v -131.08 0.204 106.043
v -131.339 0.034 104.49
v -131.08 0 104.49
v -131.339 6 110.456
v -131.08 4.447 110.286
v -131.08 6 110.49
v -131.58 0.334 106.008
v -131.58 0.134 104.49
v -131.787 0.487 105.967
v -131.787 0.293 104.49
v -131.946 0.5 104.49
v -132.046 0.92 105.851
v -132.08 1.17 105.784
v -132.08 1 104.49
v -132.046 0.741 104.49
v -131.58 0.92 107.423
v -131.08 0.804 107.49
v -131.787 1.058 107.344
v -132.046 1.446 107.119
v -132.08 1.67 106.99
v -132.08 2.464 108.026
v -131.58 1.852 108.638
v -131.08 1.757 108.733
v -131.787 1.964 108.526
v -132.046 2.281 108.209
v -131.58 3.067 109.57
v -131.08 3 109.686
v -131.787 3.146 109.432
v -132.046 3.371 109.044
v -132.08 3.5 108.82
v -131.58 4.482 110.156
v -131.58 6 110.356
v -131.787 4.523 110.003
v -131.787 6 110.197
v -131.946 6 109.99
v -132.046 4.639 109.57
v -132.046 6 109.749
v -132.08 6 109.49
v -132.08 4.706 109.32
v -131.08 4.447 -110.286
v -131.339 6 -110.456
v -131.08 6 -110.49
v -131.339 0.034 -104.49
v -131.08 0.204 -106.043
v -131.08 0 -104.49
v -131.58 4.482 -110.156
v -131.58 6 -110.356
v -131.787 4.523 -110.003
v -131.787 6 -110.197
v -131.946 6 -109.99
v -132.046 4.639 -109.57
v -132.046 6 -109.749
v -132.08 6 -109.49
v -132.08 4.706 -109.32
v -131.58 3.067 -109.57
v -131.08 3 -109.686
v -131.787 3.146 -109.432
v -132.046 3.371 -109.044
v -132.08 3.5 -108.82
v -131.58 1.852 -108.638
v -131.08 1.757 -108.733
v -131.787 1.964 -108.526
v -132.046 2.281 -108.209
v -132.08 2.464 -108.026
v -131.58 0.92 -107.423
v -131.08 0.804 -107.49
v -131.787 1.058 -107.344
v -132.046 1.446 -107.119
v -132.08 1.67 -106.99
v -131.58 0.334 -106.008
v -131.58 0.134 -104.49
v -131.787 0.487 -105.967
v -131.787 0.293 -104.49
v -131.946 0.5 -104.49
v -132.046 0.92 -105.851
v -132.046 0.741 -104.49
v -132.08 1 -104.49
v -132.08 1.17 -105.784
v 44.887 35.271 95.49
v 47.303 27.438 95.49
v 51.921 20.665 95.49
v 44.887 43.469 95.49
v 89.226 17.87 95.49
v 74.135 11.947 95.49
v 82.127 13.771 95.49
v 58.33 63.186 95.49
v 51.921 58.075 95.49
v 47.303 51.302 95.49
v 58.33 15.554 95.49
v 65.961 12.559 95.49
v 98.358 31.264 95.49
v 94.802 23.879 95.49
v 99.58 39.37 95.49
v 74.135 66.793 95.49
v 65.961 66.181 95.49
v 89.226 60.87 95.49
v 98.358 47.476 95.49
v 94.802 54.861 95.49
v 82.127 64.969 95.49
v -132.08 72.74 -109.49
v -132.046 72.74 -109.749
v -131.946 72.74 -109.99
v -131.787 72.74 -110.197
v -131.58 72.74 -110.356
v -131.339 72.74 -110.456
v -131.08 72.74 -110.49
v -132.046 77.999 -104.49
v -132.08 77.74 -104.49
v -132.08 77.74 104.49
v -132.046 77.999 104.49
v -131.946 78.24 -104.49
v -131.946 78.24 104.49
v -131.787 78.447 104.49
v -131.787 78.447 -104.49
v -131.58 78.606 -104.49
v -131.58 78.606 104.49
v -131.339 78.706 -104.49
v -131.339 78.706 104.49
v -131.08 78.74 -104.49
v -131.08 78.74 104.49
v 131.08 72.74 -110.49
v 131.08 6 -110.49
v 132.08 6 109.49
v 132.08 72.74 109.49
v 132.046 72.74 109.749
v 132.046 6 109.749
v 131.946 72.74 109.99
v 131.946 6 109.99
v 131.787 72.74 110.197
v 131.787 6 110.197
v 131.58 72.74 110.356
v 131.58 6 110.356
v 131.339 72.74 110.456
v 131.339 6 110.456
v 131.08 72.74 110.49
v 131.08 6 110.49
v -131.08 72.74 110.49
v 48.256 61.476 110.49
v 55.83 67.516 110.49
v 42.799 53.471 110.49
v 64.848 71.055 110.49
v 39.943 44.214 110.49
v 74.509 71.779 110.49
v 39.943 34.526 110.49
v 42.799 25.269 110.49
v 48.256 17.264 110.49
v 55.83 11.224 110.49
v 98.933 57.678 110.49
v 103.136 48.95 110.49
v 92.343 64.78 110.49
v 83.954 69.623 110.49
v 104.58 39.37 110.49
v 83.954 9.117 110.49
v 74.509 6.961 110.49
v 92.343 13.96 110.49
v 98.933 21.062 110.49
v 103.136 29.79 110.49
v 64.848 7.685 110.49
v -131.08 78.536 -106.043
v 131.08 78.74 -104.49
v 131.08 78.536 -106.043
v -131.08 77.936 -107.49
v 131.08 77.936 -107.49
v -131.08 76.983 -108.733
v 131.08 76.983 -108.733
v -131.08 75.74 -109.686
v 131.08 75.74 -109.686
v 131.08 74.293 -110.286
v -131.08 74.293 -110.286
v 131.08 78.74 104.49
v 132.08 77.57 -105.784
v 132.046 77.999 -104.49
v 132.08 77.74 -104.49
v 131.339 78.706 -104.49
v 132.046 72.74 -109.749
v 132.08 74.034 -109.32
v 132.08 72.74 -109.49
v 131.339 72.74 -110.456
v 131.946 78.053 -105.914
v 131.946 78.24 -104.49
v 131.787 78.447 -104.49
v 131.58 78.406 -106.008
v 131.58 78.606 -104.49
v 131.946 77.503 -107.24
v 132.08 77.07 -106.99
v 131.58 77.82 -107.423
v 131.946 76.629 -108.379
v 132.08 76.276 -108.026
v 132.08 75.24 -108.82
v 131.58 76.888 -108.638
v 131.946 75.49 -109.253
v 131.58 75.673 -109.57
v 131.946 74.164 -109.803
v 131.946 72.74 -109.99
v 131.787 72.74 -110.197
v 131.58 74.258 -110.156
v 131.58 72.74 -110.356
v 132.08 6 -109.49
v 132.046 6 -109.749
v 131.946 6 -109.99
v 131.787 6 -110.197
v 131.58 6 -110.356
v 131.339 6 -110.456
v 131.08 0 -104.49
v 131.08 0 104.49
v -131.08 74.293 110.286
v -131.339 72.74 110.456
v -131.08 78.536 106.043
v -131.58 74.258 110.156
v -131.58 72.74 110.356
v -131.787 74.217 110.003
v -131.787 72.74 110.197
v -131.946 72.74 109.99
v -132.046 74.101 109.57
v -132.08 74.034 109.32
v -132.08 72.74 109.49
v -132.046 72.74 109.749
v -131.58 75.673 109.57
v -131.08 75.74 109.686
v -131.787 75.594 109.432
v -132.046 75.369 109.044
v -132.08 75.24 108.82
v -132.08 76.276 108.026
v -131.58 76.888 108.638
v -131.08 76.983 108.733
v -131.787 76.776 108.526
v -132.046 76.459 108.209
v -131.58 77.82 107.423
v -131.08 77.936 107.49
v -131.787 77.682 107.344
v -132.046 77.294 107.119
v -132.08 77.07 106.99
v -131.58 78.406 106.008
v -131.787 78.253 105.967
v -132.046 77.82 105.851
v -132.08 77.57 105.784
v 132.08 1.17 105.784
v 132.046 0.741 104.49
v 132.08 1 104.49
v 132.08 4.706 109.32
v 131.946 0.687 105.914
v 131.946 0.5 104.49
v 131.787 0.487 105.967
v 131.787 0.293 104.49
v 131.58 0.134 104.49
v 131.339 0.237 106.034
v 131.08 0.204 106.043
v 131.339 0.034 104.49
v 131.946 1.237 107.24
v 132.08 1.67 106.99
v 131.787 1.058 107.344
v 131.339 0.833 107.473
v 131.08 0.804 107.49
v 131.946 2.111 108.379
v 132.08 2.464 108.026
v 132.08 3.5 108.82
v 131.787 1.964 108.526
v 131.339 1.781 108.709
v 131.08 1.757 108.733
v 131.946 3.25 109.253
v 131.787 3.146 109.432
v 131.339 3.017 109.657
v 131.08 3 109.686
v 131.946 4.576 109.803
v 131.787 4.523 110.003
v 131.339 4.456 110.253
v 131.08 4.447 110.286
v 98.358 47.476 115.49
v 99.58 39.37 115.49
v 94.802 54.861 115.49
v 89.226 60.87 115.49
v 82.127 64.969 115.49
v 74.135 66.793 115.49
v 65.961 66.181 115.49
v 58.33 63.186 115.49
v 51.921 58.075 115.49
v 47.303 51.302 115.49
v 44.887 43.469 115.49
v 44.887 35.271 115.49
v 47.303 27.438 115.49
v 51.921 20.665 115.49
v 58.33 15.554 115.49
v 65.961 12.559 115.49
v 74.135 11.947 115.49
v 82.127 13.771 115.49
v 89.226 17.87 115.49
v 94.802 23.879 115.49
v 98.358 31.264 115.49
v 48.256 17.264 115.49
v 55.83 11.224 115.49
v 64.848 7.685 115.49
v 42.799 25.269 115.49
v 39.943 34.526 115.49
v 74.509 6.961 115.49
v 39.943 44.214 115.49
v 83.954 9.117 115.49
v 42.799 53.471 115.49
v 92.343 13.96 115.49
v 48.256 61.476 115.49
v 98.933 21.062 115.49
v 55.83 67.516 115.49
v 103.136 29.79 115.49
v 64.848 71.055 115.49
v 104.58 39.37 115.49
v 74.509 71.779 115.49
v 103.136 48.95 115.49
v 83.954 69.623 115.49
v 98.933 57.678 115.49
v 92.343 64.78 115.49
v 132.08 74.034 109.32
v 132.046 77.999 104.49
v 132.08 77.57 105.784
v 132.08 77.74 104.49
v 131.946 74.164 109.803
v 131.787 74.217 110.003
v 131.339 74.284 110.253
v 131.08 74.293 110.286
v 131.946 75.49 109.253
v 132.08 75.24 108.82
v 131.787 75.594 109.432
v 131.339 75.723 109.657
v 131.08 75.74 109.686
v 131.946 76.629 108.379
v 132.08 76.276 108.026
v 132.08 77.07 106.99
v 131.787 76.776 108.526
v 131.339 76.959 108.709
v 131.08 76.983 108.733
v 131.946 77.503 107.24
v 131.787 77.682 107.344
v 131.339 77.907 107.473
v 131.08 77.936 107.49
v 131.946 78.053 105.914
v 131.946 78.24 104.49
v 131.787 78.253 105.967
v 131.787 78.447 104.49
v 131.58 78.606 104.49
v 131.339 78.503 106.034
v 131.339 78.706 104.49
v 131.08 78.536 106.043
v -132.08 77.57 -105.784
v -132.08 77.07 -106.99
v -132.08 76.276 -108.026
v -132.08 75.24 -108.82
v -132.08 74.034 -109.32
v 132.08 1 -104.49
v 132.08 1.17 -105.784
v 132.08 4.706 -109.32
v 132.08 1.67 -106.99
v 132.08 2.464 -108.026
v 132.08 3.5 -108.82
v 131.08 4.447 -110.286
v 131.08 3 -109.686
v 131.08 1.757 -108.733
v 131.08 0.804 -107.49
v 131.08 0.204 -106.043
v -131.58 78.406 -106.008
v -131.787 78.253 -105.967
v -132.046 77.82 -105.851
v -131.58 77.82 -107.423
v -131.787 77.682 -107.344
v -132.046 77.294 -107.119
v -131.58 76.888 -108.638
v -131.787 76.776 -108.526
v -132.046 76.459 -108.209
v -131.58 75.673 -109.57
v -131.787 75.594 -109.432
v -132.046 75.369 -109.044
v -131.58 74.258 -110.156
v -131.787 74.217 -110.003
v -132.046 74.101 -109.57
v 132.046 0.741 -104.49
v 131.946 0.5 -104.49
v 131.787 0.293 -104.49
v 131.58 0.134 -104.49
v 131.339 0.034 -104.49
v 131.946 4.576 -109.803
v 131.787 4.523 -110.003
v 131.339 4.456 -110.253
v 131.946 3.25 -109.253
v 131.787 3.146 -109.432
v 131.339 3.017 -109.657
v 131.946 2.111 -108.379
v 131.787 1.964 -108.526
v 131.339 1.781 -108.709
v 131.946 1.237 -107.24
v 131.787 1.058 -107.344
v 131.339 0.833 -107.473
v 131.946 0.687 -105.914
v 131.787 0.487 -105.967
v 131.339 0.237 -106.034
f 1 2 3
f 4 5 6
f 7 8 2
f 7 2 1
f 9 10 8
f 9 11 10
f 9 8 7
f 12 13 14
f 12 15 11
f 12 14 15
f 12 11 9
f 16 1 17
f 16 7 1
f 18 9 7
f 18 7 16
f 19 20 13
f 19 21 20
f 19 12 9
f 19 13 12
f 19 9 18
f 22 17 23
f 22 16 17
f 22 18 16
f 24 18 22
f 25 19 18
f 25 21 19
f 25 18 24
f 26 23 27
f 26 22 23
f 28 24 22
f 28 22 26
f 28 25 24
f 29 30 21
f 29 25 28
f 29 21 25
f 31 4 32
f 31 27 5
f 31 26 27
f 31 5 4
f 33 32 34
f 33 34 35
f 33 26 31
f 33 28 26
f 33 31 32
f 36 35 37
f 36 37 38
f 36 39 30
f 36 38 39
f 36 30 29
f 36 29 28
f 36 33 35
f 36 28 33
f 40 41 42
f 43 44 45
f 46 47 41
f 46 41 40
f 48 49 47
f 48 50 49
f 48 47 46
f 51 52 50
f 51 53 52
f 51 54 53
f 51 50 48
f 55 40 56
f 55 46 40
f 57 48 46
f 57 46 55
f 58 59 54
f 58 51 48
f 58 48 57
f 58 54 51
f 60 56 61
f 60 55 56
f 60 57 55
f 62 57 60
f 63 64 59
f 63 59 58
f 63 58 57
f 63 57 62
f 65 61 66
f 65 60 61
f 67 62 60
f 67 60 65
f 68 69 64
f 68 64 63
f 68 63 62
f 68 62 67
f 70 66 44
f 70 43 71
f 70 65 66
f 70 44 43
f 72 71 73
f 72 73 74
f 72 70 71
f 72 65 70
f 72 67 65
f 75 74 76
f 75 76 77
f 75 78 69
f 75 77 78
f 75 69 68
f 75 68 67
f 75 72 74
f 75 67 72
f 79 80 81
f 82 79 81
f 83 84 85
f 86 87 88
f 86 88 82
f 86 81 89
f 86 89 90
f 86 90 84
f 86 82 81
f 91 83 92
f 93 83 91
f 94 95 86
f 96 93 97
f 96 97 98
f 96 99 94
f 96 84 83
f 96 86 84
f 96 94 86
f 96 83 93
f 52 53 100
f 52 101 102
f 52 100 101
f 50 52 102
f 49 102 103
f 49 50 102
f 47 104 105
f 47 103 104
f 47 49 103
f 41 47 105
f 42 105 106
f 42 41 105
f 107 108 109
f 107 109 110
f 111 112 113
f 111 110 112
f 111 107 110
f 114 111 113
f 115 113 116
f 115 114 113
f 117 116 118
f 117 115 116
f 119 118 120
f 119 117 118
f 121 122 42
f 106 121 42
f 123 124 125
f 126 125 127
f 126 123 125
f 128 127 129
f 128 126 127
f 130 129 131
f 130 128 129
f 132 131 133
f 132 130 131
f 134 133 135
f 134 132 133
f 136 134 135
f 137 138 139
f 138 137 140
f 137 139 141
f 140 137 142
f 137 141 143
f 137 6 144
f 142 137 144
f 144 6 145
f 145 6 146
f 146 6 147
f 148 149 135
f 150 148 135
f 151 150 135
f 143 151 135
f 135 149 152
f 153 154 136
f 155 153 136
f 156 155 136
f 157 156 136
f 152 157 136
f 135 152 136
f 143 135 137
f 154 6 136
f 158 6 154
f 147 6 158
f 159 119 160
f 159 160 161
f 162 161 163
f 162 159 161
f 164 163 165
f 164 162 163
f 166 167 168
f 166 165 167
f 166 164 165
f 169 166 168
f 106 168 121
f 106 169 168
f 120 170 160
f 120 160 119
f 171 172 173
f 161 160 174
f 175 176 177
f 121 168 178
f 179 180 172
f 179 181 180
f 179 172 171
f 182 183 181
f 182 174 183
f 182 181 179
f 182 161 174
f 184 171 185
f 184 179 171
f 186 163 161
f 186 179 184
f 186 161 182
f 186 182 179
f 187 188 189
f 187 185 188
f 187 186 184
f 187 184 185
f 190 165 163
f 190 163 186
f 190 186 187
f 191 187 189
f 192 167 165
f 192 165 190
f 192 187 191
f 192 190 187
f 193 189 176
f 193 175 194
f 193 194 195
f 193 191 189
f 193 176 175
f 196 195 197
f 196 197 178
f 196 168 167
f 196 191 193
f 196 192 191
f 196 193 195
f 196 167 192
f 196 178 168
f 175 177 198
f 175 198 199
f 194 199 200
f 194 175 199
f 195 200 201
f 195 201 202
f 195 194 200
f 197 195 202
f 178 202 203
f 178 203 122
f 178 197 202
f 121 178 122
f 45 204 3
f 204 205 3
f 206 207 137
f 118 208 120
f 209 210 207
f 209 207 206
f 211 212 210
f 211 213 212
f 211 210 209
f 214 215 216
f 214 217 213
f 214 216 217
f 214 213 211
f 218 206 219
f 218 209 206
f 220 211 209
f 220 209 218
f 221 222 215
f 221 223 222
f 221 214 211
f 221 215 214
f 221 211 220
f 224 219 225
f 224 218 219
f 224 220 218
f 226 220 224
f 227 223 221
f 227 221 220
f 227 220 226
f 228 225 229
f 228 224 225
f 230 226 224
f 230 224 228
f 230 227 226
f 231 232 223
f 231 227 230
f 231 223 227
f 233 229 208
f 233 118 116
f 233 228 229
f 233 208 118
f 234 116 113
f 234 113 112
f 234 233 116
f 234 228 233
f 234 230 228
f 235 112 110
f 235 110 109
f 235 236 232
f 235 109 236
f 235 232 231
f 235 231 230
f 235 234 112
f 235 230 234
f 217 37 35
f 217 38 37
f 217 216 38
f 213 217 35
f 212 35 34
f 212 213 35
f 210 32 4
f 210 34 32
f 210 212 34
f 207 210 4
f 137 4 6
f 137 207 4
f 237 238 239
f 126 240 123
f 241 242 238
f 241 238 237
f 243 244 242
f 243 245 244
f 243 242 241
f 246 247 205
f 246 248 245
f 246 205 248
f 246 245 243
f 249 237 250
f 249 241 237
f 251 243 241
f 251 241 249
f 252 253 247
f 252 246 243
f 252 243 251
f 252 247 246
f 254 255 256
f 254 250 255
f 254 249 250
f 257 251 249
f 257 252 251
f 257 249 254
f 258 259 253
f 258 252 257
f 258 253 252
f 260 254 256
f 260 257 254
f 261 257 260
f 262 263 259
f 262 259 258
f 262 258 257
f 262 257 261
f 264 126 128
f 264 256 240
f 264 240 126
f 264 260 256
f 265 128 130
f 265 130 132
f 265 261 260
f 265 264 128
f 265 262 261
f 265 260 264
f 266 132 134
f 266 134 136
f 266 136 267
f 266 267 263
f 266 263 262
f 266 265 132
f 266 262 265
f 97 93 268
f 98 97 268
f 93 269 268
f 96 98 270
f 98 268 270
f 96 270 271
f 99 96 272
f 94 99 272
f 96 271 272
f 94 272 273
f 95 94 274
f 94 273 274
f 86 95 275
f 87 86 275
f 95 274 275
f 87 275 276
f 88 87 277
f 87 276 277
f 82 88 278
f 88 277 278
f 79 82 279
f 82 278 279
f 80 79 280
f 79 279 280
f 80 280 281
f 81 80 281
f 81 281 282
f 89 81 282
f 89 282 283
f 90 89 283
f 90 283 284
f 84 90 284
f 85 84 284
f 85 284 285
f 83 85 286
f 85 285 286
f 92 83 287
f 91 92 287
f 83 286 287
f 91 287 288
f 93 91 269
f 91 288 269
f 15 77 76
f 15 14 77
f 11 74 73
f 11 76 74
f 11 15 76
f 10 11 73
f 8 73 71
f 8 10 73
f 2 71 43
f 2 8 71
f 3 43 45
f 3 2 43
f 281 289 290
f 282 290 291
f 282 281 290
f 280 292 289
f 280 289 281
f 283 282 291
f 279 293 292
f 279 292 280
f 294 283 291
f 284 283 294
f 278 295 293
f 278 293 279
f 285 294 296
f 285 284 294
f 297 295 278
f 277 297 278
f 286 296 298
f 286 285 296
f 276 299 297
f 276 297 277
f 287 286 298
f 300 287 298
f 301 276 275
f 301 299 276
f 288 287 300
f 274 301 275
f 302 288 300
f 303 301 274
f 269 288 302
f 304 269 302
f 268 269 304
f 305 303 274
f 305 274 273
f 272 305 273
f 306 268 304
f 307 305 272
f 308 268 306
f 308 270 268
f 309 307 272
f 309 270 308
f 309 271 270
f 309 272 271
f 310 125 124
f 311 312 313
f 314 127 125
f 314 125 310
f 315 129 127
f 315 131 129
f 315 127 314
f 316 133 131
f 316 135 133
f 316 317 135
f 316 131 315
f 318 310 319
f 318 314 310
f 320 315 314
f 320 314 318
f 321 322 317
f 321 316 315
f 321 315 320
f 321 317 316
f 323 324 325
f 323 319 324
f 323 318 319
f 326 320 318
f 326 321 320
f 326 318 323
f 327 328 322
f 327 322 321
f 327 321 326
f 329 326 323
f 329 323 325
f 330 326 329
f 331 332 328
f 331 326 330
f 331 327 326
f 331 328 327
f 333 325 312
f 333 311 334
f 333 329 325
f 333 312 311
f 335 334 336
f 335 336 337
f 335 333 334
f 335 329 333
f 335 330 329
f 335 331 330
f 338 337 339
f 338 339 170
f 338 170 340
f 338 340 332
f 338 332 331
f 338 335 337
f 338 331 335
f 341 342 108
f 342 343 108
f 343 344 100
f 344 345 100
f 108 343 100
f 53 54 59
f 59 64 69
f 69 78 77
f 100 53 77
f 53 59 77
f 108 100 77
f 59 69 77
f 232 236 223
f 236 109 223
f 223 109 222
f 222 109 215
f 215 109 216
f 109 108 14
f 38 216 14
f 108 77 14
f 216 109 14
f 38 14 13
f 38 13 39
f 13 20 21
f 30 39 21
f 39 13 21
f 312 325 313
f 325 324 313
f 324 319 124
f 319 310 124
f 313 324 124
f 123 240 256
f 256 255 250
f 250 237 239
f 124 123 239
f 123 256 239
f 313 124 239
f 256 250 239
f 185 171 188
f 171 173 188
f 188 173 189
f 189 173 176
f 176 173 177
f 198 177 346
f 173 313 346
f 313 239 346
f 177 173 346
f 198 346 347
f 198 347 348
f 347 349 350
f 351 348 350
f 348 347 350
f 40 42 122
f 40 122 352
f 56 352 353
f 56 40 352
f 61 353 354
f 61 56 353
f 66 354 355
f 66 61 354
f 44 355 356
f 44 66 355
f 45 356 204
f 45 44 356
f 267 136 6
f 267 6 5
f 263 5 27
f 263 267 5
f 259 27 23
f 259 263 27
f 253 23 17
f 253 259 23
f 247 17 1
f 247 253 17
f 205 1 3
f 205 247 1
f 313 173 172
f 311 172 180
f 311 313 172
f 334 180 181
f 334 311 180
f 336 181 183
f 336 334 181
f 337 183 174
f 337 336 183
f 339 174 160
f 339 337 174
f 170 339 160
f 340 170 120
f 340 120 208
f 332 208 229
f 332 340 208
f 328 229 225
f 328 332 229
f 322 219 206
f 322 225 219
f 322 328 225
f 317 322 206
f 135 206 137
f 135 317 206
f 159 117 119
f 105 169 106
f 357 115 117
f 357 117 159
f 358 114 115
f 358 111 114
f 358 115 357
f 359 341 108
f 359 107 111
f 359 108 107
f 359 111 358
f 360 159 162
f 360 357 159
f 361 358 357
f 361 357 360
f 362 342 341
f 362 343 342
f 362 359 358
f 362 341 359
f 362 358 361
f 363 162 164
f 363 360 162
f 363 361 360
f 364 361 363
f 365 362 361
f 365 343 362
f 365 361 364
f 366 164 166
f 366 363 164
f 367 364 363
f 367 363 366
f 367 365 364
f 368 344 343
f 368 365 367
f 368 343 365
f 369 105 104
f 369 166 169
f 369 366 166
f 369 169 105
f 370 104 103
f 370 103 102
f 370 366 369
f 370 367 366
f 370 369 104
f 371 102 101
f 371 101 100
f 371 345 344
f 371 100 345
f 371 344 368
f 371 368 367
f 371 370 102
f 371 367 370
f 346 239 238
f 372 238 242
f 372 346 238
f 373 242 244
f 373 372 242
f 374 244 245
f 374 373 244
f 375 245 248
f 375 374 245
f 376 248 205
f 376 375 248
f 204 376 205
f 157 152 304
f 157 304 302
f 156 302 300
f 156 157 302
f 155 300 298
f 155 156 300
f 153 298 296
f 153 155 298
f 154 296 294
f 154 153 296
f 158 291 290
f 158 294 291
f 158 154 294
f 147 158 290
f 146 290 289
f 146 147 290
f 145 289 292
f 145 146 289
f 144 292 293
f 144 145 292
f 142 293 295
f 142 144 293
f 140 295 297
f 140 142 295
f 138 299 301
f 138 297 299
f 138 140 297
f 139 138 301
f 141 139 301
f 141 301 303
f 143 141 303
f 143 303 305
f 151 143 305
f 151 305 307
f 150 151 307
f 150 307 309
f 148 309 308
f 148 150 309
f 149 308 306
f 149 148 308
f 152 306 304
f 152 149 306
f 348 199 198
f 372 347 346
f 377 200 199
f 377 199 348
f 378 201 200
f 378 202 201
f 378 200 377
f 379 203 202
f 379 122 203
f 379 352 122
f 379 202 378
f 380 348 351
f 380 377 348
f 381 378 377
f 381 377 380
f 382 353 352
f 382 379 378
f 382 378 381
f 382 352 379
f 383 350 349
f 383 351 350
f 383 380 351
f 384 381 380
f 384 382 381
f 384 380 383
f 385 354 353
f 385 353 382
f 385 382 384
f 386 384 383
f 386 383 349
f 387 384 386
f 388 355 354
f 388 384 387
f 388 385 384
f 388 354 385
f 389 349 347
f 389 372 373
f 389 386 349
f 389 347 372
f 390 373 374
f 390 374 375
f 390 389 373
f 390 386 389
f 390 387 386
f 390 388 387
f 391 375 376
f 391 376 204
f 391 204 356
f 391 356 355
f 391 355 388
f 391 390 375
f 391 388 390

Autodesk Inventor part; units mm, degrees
ref_plane "YZ Plane" through (0, 0, 0) normal (1, 0, 0) x (0, 1, 0)
ref_plane "XZ Plane" through (0, 0, 0) normal (0, 1, 0) x (-1, 0, 0)
ref_plane "XY Plane" through (0, 0, 0) normal (0, 0, 1) x (1, 0, 0)
sketch "Sketch1" plane through (0, 0, 0) normal (0, 1, 0) x (-1, 0, 0)
  line L0 (-132.08, -110.49) -> (132.08, -110.49)
  line L1 (132.08, -110.49) -> (132.08, 110.49)
  line L2 (132.08, 110.49) -> (-132.08, 110.49)
  line L3 (-132.08, 110.49) -> (-132.08, -110.49)
  line L4 (-132.08, -110.49) -> (132.08, 110.49) construction
  line L5 (132.08, -110.49) -> (-132.08, 110.49) construction
  point P0 (0, 0)
  dimension "d0" = 264.16
  dimension "d1" = 220.98
extrude "Extrusion1" add sketch "Sketch1" along normal blind 78.74
sketch "Sketch2" plane through (-132.08, 0, 110.49) normal (0, 0, 1) x (1, 0, 0)
  line L0 (264.16, 0) -> (264.16, 78.74) projected
  line L1 (0, 78.74) -> (264.16, 78.74) projected
  circle A0 centre (204.16, 39.37) radius 32.5
  point P0 (0, 0)
  point P1 (132.08, 0)
  dimension "d4" = 60
  dimension "d5" = 65
  dimension "d6" = 78.74
  dimension "d7" = 39.37
extrude "Extrusion2" add sketch "Sketch2" along normal blind 5
sketch "Sketch3" plane through (72.08, 39.37, 115.49) normal (0, 0, 1) x (1, 0, 0)
  circle A0 centre (0, 0) radius 32.5 projected
  circle A1 centre (0, 0) radius 27.5
  point P0 (-72.08, -39.37)
  dimension "d10" = 55
extrude "Extrusion3" cut sketch "Sketch3" against normal blind 20 contours A1
fillet "Fillet1" radius 6 4 edges at (0, 78.74, 110.49) (0, 78.74, -110.49) (0, 0, -110.49) (0, 0, 110.49)
fillet "Fillet2" radius 1 16 edges at (-132.08, 76.9826, 108.7326) (-132.08, 78.74, 0) (-132.08, 76.9826, -108.7326) (-132.08, 39.37, -110.49) (-132.08, 1.7574, -108.7326) (-132.08, 0, 0) (-132.08, 1.7574, 108.7326) (-132.08, 39.37, 110.49) (132.08, 76.9826, -108.7326) (132.08, 39.37, -110.49) (132.08, 1.7574, -108.7326) (132.08, 0, 0) (132.08, 1.7574, 108.7326) (132.08, 39.37, 110.49) (132.08, 76.9826, 108.7326) (132.08, 78.74, 0)
equation "\"d7\" = 0.5 * d6"
properties part number "Projector-AcerP1500"
